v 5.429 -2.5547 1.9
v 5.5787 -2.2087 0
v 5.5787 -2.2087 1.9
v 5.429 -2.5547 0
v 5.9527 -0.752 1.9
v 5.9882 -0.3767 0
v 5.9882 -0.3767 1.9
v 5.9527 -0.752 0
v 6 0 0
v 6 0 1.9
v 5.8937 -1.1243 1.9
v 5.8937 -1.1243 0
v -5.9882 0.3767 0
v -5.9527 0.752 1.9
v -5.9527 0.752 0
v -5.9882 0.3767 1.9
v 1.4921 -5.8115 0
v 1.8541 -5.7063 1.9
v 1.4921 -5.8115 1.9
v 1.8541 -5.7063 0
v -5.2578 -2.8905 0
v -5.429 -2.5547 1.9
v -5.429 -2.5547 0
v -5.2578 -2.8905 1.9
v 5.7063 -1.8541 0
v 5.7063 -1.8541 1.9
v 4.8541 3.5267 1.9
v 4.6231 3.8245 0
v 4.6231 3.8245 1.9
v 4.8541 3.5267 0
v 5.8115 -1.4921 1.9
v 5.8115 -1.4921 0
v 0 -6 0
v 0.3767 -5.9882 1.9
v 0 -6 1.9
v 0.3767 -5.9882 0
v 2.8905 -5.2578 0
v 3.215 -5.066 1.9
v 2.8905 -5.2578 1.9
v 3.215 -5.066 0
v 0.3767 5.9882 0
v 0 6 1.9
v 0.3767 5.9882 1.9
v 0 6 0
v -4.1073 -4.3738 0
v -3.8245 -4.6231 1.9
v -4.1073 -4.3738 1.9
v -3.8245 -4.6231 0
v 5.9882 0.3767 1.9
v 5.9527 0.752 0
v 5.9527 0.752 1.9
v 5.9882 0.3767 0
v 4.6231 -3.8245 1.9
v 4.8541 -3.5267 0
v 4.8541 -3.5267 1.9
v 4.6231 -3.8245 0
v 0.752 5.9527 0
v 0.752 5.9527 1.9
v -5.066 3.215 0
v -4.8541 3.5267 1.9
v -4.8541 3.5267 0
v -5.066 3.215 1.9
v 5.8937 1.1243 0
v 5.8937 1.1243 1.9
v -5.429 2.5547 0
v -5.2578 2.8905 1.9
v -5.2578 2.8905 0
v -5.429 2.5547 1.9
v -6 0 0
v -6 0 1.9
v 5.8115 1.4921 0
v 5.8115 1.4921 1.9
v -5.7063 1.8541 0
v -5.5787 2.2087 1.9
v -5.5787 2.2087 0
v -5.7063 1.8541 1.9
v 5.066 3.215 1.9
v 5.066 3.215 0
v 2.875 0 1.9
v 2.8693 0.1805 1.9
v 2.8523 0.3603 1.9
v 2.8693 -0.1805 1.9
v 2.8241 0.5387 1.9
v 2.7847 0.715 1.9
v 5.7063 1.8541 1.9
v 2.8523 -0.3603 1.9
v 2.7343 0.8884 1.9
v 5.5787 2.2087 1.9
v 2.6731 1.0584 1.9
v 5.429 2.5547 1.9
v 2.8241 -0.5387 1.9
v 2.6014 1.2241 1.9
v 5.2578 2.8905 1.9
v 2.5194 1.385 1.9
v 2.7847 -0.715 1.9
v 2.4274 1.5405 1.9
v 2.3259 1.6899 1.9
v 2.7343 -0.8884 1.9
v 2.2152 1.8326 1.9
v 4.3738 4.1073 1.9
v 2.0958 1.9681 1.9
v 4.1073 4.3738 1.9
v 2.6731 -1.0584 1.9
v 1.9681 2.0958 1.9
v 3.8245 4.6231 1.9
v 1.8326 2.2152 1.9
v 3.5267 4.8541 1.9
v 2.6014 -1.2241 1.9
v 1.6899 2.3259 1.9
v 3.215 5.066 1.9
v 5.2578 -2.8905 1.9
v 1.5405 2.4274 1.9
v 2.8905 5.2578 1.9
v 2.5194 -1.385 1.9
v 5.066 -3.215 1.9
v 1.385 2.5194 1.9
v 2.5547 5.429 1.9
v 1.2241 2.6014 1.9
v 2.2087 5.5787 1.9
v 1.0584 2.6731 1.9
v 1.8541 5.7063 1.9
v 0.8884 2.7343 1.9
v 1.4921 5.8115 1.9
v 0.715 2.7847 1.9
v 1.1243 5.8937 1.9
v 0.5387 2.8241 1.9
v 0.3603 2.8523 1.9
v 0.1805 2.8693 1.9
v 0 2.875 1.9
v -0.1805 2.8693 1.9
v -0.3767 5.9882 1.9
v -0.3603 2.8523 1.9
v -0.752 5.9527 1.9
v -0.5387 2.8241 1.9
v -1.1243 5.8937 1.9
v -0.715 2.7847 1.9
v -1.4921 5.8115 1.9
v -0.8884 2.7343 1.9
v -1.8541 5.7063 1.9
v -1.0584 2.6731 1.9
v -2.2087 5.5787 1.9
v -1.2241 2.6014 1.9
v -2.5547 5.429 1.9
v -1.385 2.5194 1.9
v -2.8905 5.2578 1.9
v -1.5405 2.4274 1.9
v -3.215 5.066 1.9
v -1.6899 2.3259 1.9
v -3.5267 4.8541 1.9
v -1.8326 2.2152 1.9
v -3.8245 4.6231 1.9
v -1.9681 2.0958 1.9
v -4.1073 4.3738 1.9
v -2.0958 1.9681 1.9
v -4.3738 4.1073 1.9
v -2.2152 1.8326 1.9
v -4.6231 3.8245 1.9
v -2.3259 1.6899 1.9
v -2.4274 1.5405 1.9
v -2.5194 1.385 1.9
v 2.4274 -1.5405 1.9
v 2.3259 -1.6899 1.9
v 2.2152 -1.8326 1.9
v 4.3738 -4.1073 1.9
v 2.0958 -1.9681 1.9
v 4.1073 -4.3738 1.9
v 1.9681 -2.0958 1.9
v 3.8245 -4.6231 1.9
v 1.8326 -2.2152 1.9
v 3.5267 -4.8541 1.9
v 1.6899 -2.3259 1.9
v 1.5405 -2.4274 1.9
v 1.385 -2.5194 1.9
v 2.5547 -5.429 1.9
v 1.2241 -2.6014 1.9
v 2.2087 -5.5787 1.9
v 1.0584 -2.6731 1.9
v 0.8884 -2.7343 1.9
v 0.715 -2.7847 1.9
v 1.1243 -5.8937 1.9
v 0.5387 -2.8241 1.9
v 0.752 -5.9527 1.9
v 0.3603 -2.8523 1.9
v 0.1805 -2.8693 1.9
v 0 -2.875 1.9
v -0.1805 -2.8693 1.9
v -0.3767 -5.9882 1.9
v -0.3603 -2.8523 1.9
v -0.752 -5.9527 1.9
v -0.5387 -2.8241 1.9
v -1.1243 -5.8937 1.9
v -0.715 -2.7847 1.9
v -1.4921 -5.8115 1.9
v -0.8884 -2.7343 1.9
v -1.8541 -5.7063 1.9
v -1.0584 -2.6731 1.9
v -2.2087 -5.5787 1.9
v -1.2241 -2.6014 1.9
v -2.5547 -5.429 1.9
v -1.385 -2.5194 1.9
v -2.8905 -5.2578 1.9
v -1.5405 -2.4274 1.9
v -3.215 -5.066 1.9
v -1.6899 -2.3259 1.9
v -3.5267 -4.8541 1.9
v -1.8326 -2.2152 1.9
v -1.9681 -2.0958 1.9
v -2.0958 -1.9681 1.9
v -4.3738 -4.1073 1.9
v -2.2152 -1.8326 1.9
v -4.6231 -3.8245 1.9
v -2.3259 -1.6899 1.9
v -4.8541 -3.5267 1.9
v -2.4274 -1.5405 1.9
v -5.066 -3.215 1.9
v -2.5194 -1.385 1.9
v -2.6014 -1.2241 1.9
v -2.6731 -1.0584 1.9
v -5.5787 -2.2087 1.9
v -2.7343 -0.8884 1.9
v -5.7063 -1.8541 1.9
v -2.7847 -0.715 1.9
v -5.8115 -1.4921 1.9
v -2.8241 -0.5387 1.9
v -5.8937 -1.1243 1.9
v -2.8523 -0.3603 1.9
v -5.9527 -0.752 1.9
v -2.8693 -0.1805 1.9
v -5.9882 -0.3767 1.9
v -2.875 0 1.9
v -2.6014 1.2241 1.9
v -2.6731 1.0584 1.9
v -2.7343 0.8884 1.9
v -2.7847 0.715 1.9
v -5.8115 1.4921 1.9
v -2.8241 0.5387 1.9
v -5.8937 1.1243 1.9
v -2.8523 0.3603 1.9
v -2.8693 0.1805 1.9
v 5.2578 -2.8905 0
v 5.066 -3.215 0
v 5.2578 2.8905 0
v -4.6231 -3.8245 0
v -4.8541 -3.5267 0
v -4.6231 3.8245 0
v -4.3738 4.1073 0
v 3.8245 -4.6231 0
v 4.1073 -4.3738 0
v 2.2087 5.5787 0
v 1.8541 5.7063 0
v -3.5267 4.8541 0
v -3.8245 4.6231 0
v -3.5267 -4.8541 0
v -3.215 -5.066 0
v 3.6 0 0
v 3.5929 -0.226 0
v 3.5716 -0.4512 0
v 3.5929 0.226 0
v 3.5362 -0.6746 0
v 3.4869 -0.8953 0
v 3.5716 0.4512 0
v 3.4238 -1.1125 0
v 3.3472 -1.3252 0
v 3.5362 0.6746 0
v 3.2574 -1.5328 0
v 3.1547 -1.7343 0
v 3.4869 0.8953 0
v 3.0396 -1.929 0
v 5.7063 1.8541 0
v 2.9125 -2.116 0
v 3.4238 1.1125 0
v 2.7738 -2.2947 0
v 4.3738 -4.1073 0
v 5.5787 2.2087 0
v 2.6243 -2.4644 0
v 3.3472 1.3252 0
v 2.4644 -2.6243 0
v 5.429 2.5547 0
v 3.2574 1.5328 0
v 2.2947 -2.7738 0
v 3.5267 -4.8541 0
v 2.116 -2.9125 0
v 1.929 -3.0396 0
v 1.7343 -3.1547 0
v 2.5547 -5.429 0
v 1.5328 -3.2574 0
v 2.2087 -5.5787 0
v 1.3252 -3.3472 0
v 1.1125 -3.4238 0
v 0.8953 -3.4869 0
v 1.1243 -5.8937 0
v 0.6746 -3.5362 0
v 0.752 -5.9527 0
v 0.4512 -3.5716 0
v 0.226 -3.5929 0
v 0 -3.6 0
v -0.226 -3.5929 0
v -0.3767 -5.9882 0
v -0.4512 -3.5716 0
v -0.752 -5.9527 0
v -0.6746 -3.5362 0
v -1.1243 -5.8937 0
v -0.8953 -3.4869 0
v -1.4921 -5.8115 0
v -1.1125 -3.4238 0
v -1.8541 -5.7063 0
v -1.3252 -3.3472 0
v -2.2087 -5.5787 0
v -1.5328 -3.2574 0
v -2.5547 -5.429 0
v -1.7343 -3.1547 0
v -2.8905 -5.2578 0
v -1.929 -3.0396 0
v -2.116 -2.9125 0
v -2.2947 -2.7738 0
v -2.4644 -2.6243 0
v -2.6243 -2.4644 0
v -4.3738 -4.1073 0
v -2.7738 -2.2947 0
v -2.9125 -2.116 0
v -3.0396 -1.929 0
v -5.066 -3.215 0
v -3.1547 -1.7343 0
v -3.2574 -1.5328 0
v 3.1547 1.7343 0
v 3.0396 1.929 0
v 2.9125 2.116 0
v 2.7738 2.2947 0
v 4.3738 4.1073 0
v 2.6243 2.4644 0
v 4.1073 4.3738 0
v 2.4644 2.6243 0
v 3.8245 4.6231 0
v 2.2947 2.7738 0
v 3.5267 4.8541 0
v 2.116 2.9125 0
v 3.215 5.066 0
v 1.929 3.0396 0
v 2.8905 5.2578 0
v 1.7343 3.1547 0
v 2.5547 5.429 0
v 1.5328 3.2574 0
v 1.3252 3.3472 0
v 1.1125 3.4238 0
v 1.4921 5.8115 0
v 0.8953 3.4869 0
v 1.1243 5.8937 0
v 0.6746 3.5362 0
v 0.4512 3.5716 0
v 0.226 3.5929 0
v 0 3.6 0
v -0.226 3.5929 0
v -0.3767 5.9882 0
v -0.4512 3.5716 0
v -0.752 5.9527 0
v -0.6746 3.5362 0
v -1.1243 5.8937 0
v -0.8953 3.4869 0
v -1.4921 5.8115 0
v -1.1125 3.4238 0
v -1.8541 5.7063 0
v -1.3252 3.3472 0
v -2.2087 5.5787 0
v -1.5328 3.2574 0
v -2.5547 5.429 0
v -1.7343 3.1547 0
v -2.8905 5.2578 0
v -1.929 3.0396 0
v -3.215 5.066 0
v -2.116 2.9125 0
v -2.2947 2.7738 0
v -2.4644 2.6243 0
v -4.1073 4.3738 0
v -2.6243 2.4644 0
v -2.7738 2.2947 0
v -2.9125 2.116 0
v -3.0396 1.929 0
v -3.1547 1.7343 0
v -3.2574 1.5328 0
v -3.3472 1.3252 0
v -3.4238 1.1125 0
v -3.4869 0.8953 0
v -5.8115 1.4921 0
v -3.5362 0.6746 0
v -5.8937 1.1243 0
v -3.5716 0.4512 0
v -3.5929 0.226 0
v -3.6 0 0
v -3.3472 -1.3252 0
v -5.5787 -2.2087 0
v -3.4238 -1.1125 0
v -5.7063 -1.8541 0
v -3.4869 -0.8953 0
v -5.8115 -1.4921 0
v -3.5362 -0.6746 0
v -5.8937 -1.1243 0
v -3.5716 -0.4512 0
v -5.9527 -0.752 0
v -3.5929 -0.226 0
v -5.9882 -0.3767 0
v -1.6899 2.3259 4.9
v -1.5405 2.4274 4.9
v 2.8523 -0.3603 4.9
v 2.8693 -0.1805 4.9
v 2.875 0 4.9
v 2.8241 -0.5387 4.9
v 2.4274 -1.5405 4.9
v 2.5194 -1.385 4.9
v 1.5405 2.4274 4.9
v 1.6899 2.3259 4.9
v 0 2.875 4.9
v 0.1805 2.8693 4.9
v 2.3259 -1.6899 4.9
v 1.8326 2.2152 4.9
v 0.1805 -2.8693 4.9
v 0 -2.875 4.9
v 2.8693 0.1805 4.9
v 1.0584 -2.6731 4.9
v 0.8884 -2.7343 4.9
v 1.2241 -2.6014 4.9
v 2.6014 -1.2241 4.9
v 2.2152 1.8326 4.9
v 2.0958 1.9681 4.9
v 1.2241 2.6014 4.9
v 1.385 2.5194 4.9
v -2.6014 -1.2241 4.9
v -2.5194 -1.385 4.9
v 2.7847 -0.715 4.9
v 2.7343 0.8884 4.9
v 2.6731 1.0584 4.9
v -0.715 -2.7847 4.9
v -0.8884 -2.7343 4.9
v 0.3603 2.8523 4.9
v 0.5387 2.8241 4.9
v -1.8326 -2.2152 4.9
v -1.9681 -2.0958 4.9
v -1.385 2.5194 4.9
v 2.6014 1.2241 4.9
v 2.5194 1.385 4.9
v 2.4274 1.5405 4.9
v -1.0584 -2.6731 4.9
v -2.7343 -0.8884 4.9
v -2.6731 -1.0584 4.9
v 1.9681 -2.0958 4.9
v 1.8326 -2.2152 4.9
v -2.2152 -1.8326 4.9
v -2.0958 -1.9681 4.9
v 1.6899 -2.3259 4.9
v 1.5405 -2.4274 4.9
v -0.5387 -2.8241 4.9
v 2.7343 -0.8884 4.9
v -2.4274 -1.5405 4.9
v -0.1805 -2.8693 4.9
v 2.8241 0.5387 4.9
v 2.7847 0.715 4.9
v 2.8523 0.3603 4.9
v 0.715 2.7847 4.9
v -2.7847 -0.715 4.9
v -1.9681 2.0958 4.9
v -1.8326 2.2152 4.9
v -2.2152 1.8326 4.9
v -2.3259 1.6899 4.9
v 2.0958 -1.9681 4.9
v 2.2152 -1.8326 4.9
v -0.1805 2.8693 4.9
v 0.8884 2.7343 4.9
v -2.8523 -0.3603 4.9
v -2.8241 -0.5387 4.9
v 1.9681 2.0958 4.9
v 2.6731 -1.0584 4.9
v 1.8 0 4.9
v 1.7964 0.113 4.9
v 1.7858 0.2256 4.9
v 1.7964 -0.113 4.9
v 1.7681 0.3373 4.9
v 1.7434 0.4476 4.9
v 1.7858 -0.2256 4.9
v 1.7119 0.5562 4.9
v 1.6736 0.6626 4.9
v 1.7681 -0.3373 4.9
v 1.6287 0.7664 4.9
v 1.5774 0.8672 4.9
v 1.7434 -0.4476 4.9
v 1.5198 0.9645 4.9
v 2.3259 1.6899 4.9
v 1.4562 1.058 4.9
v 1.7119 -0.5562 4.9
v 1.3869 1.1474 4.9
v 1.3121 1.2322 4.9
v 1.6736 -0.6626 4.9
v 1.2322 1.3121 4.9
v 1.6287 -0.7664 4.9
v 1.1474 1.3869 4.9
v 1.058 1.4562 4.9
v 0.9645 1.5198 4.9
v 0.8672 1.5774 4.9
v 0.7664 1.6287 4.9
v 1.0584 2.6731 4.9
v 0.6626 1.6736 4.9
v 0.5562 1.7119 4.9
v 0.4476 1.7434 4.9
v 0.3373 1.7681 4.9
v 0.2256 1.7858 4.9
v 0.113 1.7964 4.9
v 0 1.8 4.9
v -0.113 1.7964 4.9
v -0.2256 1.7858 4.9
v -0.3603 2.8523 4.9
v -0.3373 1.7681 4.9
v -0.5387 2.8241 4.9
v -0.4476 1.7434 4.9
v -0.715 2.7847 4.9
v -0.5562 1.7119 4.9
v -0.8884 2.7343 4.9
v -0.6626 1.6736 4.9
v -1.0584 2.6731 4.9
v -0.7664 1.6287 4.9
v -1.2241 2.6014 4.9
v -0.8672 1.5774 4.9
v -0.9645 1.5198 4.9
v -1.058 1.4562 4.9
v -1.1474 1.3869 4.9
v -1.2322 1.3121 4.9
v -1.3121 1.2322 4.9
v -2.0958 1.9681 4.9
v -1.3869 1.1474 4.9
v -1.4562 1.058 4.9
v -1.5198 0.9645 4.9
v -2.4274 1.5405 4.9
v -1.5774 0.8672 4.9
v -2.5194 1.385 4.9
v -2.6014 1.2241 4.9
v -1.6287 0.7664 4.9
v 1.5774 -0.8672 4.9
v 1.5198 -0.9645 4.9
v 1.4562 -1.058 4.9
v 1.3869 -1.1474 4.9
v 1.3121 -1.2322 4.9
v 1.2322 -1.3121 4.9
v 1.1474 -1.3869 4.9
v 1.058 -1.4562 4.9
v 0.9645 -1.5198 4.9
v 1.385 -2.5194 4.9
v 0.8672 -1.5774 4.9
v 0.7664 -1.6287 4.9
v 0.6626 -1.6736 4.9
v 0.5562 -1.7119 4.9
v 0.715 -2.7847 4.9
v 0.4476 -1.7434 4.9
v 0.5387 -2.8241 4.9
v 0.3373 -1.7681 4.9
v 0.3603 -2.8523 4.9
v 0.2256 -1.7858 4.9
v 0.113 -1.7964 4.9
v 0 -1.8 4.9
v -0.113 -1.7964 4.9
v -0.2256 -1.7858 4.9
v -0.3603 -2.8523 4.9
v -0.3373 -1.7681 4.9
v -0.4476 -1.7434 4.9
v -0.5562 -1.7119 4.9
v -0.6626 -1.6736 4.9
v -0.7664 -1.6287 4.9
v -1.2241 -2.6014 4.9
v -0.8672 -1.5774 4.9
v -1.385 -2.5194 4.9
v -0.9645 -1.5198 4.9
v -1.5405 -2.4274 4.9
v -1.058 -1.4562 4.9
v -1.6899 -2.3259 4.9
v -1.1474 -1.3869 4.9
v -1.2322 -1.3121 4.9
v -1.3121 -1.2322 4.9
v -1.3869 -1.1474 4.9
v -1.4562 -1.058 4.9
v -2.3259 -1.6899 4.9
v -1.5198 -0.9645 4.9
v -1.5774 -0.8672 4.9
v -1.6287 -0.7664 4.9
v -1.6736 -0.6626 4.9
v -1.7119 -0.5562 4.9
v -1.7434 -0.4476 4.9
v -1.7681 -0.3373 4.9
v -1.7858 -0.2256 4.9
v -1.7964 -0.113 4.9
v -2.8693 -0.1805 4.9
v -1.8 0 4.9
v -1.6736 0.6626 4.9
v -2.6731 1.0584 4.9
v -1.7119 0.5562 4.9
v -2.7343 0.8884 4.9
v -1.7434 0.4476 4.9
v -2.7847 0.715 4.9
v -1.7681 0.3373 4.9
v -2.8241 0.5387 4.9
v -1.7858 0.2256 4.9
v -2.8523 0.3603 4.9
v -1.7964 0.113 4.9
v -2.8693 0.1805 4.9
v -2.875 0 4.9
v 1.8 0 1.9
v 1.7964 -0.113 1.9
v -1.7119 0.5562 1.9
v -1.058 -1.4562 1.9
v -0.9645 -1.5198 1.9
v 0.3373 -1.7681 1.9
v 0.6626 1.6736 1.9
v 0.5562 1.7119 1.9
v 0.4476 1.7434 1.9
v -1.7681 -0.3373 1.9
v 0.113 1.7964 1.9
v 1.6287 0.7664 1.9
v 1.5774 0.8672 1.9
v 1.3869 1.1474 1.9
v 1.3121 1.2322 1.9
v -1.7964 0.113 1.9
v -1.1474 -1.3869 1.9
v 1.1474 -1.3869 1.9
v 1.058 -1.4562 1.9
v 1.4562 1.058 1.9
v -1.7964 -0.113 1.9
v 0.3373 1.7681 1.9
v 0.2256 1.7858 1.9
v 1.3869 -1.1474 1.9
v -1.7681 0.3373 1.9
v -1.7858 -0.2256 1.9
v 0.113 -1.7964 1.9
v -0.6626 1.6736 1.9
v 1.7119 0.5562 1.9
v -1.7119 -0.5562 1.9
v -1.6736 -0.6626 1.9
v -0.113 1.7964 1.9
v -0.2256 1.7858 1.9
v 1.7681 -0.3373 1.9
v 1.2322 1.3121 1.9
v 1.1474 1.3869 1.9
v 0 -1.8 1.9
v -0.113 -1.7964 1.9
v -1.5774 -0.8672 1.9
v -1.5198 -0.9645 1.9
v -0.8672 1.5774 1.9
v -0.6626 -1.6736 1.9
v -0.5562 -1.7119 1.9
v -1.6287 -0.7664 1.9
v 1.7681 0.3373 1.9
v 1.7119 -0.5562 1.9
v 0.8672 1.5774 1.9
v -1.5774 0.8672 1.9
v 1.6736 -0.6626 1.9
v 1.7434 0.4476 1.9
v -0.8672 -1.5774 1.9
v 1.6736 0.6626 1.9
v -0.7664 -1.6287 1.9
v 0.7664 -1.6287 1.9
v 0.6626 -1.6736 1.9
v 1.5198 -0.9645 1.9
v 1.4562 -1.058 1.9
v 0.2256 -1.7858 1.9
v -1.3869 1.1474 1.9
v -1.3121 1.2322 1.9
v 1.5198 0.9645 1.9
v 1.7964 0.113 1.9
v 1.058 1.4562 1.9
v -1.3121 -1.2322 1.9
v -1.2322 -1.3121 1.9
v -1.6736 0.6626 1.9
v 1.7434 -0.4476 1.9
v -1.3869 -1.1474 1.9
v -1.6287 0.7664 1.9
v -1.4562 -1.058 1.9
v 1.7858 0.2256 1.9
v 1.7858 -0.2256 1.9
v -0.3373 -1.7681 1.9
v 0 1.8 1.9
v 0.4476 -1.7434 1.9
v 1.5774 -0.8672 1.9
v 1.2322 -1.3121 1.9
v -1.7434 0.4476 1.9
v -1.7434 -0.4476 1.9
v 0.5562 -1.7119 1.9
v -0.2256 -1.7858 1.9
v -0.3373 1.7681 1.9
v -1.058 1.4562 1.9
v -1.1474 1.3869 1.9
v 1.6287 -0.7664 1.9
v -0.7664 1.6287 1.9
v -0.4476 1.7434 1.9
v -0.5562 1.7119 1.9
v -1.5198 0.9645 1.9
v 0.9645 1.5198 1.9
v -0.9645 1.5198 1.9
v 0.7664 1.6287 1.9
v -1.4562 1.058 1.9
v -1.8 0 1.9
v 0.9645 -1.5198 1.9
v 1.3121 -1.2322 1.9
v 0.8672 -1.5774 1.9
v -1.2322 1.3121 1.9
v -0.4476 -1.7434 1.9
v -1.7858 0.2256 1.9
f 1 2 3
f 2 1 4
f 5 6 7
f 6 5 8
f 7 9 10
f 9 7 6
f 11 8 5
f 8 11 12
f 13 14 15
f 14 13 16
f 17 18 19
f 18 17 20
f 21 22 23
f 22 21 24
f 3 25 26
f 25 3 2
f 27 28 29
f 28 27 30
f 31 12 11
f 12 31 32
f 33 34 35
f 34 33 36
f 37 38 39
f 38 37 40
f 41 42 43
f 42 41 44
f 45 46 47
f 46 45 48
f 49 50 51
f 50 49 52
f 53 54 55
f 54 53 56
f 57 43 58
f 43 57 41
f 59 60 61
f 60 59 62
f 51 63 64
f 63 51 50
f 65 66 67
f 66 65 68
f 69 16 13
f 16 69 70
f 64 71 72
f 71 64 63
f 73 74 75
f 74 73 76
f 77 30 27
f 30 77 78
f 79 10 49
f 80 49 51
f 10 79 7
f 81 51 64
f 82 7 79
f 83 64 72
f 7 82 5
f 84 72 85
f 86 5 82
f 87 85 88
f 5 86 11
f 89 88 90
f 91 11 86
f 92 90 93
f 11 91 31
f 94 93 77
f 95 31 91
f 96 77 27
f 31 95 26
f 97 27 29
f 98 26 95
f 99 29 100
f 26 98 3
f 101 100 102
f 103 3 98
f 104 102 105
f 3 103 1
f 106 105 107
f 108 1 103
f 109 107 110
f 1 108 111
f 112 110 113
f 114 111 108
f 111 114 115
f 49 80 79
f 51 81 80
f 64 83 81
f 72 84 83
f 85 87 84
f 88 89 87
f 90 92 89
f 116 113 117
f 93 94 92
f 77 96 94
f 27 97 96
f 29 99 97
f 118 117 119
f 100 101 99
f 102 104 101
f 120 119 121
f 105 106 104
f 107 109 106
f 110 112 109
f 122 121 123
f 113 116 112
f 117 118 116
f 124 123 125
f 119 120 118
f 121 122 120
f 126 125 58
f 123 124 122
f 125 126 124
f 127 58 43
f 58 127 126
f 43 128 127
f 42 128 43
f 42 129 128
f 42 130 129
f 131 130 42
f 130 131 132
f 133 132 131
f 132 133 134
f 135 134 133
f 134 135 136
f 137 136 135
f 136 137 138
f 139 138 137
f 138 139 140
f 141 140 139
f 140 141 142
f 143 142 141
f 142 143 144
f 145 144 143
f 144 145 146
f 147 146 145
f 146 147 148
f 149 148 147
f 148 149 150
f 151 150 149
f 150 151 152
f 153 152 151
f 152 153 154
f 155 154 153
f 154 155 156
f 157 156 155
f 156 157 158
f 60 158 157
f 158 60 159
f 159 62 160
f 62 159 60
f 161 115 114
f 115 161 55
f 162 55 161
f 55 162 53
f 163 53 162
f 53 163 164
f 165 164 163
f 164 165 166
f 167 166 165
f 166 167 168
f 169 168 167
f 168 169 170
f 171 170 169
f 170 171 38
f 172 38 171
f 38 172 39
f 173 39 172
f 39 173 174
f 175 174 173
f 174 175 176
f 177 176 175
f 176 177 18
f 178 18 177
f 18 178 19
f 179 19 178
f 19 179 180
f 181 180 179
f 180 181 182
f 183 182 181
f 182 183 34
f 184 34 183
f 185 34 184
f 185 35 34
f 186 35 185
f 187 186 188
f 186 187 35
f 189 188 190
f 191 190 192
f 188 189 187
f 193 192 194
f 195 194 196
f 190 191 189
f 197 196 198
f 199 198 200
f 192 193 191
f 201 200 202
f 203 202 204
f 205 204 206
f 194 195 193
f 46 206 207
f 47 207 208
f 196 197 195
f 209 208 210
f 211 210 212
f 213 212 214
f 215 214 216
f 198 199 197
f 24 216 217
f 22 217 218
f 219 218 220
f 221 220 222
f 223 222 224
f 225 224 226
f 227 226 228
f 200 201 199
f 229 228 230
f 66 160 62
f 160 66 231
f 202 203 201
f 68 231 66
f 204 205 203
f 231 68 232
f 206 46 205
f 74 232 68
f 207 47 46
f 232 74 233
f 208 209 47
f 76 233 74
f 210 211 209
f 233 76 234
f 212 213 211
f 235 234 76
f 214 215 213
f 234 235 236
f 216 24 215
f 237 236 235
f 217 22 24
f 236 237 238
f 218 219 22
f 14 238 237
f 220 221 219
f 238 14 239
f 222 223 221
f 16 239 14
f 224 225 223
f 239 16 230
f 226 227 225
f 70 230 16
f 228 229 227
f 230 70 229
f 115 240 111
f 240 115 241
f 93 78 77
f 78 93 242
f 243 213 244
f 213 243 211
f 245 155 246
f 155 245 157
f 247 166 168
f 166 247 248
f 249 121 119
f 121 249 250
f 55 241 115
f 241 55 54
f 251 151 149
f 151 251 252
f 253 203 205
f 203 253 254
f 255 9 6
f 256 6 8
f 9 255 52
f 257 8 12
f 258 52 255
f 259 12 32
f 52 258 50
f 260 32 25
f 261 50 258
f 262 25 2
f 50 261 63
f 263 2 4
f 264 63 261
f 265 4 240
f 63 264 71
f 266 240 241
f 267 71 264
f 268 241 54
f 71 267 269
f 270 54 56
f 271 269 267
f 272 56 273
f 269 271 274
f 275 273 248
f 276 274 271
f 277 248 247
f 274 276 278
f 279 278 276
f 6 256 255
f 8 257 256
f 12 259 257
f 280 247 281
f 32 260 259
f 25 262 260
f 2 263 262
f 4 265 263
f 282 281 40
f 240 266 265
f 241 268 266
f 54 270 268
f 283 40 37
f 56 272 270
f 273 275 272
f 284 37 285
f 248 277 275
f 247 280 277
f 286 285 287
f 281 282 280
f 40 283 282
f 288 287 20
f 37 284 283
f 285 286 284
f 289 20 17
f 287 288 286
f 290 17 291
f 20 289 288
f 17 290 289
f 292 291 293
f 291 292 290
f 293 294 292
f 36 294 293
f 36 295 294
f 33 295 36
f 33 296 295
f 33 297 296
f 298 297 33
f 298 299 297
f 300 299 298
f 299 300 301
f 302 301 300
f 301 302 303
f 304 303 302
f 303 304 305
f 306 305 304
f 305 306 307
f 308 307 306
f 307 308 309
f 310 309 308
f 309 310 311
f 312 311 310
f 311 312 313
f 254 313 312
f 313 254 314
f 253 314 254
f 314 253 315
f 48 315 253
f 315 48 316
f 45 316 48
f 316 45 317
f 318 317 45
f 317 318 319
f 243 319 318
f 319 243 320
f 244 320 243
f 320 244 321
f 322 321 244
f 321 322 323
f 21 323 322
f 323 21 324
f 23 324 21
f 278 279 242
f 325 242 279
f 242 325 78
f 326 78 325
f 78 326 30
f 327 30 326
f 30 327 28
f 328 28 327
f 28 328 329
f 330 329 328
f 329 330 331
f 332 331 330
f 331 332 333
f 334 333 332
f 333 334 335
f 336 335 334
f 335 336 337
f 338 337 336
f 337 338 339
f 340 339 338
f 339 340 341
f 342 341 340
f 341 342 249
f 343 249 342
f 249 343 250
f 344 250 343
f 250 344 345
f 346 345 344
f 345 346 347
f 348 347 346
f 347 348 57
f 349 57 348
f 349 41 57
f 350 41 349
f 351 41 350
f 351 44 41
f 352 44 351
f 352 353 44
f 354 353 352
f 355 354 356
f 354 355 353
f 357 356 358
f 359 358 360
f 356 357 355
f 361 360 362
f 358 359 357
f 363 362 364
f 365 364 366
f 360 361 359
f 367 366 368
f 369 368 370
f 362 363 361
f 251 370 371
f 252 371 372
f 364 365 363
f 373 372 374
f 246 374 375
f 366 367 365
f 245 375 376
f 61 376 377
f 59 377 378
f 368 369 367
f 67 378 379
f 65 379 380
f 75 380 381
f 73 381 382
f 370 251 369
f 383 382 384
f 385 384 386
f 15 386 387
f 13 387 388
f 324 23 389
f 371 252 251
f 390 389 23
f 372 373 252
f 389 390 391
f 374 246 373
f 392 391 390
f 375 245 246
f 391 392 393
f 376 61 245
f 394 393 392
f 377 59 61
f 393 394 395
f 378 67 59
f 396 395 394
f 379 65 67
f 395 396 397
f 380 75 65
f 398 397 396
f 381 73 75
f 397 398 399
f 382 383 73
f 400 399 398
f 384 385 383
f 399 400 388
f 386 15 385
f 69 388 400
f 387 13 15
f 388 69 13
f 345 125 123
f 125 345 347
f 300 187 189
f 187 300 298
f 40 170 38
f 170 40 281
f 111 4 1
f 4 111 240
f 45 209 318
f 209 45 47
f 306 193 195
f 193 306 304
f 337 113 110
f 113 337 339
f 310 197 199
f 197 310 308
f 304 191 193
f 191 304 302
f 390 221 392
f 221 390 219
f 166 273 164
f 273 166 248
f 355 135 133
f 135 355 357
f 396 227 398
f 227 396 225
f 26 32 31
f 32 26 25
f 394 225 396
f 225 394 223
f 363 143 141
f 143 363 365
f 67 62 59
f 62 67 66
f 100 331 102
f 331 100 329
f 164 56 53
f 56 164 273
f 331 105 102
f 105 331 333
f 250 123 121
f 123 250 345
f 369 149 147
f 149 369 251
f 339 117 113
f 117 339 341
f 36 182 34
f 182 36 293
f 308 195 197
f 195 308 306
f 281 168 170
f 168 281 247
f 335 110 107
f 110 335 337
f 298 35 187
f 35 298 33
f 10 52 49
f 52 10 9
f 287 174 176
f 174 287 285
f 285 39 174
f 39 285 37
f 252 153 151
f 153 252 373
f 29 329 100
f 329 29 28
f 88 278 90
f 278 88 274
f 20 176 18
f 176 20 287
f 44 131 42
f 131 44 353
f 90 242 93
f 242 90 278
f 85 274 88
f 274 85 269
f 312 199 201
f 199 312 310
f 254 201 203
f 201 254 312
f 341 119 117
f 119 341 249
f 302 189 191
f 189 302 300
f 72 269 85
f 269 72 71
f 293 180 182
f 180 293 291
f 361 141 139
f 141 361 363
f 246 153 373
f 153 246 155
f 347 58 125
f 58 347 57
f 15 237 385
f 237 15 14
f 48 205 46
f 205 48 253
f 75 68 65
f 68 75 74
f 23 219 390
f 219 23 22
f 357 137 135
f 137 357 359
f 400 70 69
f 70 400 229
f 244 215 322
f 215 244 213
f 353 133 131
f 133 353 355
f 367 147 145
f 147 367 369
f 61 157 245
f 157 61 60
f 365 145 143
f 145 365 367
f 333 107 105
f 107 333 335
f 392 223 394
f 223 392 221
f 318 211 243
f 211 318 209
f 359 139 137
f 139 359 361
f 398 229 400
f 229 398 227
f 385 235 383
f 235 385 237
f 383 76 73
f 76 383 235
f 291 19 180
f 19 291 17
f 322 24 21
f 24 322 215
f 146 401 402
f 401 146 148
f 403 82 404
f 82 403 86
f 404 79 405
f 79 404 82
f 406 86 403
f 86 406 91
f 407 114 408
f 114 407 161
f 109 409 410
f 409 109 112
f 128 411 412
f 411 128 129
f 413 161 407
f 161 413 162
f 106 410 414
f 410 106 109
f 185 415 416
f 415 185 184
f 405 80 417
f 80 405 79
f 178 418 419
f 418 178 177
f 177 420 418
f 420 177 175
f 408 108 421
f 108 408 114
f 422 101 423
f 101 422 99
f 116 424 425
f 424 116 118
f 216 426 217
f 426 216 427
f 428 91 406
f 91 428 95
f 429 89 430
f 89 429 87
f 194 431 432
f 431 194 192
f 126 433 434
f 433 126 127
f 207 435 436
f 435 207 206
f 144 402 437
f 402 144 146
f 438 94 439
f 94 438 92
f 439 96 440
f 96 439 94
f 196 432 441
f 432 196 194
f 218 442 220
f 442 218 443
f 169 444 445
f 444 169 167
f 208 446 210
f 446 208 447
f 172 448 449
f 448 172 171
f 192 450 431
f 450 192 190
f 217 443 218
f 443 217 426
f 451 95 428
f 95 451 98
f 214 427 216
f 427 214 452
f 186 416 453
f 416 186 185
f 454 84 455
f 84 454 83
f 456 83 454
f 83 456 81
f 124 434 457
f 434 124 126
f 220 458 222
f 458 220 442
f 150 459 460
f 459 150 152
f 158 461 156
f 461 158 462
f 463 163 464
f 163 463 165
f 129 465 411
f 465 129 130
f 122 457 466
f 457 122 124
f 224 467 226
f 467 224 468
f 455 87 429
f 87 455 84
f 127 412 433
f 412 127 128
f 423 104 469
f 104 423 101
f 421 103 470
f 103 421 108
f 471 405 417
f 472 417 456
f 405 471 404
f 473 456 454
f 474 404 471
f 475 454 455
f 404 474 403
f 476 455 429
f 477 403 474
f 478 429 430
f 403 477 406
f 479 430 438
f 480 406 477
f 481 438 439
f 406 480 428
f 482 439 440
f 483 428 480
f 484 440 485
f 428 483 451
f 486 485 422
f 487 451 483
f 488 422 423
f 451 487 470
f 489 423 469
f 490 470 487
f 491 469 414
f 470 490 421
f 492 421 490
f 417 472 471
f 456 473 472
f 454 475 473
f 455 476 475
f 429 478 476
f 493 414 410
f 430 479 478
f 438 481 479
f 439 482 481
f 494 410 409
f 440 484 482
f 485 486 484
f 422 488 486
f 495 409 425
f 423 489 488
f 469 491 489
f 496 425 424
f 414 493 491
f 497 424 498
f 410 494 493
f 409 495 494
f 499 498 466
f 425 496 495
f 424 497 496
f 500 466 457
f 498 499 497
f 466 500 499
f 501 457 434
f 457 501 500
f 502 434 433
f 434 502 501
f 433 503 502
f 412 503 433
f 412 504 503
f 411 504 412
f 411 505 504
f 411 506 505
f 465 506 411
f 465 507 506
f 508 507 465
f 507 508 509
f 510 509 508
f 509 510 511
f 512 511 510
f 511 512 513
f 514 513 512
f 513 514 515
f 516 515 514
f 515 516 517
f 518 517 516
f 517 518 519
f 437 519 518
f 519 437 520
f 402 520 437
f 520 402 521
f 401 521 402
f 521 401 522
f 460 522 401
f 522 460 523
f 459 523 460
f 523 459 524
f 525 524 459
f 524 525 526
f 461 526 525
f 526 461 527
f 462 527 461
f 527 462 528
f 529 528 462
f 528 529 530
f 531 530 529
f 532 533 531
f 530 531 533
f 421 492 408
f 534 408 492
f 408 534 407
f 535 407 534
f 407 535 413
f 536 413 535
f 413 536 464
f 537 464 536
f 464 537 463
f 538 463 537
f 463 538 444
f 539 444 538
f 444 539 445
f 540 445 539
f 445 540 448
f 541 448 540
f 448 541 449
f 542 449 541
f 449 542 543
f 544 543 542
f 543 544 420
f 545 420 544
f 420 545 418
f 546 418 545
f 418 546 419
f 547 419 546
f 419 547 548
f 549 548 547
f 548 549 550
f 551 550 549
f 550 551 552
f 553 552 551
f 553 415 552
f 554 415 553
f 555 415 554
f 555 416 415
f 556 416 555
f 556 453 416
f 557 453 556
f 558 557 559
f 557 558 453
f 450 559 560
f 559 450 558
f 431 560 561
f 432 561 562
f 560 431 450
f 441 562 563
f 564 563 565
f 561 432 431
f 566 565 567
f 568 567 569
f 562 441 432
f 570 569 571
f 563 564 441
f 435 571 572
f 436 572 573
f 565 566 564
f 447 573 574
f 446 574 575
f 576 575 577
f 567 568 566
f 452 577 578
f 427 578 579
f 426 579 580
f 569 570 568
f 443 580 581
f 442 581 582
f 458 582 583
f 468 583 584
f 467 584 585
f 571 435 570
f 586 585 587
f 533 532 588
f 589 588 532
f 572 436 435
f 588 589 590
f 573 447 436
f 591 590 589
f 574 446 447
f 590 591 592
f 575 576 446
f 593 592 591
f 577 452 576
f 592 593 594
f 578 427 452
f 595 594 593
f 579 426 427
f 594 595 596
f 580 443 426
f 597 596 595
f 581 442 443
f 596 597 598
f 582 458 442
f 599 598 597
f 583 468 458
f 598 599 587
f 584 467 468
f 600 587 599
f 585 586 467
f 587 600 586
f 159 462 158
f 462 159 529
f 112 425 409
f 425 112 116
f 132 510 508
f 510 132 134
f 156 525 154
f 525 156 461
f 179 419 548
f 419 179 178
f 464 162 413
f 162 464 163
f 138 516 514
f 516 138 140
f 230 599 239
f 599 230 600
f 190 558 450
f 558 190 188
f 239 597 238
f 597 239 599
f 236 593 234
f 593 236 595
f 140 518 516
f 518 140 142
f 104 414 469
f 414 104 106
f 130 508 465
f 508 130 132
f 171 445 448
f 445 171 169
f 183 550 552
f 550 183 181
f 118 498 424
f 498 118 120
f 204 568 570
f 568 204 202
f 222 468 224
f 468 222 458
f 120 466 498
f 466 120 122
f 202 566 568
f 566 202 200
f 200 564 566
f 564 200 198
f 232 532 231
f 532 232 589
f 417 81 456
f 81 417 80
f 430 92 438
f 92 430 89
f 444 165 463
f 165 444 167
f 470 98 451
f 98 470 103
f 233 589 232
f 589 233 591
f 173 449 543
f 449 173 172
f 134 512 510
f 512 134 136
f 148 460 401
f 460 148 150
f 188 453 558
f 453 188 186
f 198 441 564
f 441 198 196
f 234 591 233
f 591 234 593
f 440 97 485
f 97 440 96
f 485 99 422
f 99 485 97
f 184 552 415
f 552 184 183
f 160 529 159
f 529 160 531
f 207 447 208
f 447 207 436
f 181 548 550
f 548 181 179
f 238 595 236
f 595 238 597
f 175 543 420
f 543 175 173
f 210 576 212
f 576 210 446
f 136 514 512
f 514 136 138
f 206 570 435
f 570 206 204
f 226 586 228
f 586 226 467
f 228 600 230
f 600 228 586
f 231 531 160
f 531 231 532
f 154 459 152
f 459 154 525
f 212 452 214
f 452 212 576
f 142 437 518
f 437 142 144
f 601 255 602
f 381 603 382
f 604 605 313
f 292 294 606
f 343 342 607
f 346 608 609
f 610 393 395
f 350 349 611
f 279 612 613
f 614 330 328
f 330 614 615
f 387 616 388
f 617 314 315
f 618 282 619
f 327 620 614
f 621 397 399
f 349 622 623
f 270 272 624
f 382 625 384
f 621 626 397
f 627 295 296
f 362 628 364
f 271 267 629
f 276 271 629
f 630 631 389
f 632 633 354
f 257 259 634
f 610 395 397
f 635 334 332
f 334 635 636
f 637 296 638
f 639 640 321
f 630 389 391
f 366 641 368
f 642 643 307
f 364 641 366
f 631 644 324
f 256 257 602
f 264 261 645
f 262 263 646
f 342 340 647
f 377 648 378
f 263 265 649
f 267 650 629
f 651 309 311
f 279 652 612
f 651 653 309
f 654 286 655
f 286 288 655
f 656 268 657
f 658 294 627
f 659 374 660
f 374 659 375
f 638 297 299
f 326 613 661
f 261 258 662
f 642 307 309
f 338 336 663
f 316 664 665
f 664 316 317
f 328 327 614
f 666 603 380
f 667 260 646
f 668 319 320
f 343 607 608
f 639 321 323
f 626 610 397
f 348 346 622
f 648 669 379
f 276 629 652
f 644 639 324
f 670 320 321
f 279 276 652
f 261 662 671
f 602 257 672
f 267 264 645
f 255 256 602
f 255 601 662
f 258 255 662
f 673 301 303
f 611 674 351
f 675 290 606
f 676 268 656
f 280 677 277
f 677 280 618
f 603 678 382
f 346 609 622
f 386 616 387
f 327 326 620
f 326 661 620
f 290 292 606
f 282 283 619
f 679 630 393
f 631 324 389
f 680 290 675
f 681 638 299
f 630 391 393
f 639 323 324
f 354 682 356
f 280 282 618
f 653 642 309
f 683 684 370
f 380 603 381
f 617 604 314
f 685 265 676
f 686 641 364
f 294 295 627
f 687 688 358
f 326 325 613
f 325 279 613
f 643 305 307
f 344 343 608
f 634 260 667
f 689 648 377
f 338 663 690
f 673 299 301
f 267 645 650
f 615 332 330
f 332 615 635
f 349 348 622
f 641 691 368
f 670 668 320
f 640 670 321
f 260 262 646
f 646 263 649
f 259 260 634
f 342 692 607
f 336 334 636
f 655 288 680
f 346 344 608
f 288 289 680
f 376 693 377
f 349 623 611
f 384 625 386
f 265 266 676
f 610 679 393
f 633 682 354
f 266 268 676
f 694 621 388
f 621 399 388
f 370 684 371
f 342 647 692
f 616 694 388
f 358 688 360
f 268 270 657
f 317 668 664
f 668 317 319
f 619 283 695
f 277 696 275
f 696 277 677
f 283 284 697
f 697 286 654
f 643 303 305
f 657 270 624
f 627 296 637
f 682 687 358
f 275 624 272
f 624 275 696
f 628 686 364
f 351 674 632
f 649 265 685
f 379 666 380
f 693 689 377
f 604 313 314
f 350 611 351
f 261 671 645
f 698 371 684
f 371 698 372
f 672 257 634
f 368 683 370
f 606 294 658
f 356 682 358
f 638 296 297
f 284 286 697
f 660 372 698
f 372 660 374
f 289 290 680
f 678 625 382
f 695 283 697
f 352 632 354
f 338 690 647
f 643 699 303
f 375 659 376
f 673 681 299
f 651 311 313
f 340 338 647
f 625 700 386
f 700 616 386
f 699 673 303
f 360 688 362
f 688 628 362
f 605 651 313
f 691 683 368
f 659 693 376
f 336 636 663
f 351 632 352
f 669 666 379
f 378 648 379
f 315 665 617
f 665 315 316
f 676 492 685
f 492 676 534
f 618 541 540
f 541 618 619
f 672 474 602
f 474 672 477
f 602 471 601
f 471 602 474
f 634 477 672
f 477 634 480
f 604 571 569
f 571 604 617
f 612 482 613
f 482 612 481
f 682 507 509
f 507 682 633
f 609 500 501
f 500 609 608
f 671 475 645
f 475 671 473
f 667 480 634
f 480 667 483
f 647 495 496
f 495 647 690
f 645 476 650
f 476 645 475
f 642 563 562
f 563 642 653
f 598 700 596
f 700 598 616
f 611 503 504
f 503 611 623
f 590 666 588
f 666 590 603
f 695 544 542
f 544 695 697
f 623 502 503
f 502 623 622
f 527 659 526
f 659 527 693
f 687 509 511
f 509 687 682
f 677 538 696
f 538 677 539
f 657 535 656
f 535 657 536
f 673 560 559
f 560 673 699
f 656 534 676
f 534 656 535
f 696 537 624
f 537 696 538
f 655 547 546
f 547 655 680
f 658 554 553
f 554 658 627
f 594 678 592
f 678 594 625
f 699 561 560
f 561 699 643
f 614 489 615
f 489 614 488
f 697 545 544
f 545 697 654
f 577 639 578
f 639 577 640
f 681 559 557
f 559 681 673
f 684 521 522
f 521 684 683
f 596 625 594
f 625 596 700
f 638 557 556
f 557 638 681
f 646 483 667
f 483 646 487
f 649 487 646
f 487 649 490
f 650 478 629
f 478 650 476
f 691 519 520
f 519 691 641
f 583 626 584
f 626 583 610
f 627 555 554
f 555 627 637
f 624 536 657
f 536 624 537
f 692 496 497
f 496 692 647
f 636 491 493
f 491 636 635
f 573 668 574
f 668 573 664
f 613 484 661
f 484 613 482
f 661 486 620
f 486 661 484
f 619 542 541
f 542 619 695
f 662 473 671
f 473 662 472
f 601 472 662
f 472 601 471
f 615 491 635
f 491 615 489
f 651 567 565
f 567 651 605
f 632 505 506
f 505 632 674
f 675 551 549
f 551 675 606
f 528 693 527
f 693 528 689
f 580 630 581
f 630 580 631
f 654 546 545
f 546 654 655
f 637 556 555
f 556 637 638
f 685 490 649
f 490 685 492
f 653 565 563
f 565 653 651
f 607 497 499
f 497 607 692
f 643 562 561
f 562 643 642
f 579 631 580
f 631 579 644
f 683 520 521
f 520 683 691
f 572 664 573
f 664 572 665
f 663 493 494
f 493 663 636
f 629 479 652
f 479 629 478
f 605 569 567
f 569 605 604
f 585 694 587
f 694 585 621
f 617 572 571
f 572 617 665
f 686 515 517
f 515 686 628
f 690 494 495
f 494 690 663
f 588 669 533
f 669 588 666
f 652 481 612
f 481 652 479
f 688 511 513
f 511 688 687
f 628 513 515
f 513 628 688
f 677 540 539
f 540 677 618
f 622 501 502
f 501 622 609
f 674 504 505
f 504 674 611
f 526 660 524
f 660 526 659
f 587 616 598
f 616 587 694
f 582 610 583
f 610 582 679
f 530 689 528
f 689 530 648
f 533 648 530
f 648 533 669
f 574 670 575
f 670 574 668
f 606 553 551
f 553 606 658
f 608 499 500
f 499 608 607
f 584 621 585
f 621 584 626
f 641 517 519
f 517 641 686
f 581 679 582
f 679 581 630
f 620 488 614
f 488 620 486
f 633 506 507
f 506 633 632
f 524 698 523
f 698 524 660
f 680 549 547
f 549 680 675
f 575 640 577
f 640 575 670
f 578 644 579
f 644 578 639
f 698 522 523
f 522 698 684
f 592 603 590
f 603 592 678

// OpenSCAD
$fn = 100;

translate([0, 0, 1.9]) rotate([180, 0, 0])
difference() {
    union() {
        cylinder(h=1.9, d=12);
        translate([0, 0, -3]) cylinder(h=3, d=5.75);
    }
    translate([0, 0, 0]) cylinder(h=1.9, r1=1.8, r2=3.6);
    translate([0, 0, -4]) cylinder(h=6.9, r=1.8);
}
